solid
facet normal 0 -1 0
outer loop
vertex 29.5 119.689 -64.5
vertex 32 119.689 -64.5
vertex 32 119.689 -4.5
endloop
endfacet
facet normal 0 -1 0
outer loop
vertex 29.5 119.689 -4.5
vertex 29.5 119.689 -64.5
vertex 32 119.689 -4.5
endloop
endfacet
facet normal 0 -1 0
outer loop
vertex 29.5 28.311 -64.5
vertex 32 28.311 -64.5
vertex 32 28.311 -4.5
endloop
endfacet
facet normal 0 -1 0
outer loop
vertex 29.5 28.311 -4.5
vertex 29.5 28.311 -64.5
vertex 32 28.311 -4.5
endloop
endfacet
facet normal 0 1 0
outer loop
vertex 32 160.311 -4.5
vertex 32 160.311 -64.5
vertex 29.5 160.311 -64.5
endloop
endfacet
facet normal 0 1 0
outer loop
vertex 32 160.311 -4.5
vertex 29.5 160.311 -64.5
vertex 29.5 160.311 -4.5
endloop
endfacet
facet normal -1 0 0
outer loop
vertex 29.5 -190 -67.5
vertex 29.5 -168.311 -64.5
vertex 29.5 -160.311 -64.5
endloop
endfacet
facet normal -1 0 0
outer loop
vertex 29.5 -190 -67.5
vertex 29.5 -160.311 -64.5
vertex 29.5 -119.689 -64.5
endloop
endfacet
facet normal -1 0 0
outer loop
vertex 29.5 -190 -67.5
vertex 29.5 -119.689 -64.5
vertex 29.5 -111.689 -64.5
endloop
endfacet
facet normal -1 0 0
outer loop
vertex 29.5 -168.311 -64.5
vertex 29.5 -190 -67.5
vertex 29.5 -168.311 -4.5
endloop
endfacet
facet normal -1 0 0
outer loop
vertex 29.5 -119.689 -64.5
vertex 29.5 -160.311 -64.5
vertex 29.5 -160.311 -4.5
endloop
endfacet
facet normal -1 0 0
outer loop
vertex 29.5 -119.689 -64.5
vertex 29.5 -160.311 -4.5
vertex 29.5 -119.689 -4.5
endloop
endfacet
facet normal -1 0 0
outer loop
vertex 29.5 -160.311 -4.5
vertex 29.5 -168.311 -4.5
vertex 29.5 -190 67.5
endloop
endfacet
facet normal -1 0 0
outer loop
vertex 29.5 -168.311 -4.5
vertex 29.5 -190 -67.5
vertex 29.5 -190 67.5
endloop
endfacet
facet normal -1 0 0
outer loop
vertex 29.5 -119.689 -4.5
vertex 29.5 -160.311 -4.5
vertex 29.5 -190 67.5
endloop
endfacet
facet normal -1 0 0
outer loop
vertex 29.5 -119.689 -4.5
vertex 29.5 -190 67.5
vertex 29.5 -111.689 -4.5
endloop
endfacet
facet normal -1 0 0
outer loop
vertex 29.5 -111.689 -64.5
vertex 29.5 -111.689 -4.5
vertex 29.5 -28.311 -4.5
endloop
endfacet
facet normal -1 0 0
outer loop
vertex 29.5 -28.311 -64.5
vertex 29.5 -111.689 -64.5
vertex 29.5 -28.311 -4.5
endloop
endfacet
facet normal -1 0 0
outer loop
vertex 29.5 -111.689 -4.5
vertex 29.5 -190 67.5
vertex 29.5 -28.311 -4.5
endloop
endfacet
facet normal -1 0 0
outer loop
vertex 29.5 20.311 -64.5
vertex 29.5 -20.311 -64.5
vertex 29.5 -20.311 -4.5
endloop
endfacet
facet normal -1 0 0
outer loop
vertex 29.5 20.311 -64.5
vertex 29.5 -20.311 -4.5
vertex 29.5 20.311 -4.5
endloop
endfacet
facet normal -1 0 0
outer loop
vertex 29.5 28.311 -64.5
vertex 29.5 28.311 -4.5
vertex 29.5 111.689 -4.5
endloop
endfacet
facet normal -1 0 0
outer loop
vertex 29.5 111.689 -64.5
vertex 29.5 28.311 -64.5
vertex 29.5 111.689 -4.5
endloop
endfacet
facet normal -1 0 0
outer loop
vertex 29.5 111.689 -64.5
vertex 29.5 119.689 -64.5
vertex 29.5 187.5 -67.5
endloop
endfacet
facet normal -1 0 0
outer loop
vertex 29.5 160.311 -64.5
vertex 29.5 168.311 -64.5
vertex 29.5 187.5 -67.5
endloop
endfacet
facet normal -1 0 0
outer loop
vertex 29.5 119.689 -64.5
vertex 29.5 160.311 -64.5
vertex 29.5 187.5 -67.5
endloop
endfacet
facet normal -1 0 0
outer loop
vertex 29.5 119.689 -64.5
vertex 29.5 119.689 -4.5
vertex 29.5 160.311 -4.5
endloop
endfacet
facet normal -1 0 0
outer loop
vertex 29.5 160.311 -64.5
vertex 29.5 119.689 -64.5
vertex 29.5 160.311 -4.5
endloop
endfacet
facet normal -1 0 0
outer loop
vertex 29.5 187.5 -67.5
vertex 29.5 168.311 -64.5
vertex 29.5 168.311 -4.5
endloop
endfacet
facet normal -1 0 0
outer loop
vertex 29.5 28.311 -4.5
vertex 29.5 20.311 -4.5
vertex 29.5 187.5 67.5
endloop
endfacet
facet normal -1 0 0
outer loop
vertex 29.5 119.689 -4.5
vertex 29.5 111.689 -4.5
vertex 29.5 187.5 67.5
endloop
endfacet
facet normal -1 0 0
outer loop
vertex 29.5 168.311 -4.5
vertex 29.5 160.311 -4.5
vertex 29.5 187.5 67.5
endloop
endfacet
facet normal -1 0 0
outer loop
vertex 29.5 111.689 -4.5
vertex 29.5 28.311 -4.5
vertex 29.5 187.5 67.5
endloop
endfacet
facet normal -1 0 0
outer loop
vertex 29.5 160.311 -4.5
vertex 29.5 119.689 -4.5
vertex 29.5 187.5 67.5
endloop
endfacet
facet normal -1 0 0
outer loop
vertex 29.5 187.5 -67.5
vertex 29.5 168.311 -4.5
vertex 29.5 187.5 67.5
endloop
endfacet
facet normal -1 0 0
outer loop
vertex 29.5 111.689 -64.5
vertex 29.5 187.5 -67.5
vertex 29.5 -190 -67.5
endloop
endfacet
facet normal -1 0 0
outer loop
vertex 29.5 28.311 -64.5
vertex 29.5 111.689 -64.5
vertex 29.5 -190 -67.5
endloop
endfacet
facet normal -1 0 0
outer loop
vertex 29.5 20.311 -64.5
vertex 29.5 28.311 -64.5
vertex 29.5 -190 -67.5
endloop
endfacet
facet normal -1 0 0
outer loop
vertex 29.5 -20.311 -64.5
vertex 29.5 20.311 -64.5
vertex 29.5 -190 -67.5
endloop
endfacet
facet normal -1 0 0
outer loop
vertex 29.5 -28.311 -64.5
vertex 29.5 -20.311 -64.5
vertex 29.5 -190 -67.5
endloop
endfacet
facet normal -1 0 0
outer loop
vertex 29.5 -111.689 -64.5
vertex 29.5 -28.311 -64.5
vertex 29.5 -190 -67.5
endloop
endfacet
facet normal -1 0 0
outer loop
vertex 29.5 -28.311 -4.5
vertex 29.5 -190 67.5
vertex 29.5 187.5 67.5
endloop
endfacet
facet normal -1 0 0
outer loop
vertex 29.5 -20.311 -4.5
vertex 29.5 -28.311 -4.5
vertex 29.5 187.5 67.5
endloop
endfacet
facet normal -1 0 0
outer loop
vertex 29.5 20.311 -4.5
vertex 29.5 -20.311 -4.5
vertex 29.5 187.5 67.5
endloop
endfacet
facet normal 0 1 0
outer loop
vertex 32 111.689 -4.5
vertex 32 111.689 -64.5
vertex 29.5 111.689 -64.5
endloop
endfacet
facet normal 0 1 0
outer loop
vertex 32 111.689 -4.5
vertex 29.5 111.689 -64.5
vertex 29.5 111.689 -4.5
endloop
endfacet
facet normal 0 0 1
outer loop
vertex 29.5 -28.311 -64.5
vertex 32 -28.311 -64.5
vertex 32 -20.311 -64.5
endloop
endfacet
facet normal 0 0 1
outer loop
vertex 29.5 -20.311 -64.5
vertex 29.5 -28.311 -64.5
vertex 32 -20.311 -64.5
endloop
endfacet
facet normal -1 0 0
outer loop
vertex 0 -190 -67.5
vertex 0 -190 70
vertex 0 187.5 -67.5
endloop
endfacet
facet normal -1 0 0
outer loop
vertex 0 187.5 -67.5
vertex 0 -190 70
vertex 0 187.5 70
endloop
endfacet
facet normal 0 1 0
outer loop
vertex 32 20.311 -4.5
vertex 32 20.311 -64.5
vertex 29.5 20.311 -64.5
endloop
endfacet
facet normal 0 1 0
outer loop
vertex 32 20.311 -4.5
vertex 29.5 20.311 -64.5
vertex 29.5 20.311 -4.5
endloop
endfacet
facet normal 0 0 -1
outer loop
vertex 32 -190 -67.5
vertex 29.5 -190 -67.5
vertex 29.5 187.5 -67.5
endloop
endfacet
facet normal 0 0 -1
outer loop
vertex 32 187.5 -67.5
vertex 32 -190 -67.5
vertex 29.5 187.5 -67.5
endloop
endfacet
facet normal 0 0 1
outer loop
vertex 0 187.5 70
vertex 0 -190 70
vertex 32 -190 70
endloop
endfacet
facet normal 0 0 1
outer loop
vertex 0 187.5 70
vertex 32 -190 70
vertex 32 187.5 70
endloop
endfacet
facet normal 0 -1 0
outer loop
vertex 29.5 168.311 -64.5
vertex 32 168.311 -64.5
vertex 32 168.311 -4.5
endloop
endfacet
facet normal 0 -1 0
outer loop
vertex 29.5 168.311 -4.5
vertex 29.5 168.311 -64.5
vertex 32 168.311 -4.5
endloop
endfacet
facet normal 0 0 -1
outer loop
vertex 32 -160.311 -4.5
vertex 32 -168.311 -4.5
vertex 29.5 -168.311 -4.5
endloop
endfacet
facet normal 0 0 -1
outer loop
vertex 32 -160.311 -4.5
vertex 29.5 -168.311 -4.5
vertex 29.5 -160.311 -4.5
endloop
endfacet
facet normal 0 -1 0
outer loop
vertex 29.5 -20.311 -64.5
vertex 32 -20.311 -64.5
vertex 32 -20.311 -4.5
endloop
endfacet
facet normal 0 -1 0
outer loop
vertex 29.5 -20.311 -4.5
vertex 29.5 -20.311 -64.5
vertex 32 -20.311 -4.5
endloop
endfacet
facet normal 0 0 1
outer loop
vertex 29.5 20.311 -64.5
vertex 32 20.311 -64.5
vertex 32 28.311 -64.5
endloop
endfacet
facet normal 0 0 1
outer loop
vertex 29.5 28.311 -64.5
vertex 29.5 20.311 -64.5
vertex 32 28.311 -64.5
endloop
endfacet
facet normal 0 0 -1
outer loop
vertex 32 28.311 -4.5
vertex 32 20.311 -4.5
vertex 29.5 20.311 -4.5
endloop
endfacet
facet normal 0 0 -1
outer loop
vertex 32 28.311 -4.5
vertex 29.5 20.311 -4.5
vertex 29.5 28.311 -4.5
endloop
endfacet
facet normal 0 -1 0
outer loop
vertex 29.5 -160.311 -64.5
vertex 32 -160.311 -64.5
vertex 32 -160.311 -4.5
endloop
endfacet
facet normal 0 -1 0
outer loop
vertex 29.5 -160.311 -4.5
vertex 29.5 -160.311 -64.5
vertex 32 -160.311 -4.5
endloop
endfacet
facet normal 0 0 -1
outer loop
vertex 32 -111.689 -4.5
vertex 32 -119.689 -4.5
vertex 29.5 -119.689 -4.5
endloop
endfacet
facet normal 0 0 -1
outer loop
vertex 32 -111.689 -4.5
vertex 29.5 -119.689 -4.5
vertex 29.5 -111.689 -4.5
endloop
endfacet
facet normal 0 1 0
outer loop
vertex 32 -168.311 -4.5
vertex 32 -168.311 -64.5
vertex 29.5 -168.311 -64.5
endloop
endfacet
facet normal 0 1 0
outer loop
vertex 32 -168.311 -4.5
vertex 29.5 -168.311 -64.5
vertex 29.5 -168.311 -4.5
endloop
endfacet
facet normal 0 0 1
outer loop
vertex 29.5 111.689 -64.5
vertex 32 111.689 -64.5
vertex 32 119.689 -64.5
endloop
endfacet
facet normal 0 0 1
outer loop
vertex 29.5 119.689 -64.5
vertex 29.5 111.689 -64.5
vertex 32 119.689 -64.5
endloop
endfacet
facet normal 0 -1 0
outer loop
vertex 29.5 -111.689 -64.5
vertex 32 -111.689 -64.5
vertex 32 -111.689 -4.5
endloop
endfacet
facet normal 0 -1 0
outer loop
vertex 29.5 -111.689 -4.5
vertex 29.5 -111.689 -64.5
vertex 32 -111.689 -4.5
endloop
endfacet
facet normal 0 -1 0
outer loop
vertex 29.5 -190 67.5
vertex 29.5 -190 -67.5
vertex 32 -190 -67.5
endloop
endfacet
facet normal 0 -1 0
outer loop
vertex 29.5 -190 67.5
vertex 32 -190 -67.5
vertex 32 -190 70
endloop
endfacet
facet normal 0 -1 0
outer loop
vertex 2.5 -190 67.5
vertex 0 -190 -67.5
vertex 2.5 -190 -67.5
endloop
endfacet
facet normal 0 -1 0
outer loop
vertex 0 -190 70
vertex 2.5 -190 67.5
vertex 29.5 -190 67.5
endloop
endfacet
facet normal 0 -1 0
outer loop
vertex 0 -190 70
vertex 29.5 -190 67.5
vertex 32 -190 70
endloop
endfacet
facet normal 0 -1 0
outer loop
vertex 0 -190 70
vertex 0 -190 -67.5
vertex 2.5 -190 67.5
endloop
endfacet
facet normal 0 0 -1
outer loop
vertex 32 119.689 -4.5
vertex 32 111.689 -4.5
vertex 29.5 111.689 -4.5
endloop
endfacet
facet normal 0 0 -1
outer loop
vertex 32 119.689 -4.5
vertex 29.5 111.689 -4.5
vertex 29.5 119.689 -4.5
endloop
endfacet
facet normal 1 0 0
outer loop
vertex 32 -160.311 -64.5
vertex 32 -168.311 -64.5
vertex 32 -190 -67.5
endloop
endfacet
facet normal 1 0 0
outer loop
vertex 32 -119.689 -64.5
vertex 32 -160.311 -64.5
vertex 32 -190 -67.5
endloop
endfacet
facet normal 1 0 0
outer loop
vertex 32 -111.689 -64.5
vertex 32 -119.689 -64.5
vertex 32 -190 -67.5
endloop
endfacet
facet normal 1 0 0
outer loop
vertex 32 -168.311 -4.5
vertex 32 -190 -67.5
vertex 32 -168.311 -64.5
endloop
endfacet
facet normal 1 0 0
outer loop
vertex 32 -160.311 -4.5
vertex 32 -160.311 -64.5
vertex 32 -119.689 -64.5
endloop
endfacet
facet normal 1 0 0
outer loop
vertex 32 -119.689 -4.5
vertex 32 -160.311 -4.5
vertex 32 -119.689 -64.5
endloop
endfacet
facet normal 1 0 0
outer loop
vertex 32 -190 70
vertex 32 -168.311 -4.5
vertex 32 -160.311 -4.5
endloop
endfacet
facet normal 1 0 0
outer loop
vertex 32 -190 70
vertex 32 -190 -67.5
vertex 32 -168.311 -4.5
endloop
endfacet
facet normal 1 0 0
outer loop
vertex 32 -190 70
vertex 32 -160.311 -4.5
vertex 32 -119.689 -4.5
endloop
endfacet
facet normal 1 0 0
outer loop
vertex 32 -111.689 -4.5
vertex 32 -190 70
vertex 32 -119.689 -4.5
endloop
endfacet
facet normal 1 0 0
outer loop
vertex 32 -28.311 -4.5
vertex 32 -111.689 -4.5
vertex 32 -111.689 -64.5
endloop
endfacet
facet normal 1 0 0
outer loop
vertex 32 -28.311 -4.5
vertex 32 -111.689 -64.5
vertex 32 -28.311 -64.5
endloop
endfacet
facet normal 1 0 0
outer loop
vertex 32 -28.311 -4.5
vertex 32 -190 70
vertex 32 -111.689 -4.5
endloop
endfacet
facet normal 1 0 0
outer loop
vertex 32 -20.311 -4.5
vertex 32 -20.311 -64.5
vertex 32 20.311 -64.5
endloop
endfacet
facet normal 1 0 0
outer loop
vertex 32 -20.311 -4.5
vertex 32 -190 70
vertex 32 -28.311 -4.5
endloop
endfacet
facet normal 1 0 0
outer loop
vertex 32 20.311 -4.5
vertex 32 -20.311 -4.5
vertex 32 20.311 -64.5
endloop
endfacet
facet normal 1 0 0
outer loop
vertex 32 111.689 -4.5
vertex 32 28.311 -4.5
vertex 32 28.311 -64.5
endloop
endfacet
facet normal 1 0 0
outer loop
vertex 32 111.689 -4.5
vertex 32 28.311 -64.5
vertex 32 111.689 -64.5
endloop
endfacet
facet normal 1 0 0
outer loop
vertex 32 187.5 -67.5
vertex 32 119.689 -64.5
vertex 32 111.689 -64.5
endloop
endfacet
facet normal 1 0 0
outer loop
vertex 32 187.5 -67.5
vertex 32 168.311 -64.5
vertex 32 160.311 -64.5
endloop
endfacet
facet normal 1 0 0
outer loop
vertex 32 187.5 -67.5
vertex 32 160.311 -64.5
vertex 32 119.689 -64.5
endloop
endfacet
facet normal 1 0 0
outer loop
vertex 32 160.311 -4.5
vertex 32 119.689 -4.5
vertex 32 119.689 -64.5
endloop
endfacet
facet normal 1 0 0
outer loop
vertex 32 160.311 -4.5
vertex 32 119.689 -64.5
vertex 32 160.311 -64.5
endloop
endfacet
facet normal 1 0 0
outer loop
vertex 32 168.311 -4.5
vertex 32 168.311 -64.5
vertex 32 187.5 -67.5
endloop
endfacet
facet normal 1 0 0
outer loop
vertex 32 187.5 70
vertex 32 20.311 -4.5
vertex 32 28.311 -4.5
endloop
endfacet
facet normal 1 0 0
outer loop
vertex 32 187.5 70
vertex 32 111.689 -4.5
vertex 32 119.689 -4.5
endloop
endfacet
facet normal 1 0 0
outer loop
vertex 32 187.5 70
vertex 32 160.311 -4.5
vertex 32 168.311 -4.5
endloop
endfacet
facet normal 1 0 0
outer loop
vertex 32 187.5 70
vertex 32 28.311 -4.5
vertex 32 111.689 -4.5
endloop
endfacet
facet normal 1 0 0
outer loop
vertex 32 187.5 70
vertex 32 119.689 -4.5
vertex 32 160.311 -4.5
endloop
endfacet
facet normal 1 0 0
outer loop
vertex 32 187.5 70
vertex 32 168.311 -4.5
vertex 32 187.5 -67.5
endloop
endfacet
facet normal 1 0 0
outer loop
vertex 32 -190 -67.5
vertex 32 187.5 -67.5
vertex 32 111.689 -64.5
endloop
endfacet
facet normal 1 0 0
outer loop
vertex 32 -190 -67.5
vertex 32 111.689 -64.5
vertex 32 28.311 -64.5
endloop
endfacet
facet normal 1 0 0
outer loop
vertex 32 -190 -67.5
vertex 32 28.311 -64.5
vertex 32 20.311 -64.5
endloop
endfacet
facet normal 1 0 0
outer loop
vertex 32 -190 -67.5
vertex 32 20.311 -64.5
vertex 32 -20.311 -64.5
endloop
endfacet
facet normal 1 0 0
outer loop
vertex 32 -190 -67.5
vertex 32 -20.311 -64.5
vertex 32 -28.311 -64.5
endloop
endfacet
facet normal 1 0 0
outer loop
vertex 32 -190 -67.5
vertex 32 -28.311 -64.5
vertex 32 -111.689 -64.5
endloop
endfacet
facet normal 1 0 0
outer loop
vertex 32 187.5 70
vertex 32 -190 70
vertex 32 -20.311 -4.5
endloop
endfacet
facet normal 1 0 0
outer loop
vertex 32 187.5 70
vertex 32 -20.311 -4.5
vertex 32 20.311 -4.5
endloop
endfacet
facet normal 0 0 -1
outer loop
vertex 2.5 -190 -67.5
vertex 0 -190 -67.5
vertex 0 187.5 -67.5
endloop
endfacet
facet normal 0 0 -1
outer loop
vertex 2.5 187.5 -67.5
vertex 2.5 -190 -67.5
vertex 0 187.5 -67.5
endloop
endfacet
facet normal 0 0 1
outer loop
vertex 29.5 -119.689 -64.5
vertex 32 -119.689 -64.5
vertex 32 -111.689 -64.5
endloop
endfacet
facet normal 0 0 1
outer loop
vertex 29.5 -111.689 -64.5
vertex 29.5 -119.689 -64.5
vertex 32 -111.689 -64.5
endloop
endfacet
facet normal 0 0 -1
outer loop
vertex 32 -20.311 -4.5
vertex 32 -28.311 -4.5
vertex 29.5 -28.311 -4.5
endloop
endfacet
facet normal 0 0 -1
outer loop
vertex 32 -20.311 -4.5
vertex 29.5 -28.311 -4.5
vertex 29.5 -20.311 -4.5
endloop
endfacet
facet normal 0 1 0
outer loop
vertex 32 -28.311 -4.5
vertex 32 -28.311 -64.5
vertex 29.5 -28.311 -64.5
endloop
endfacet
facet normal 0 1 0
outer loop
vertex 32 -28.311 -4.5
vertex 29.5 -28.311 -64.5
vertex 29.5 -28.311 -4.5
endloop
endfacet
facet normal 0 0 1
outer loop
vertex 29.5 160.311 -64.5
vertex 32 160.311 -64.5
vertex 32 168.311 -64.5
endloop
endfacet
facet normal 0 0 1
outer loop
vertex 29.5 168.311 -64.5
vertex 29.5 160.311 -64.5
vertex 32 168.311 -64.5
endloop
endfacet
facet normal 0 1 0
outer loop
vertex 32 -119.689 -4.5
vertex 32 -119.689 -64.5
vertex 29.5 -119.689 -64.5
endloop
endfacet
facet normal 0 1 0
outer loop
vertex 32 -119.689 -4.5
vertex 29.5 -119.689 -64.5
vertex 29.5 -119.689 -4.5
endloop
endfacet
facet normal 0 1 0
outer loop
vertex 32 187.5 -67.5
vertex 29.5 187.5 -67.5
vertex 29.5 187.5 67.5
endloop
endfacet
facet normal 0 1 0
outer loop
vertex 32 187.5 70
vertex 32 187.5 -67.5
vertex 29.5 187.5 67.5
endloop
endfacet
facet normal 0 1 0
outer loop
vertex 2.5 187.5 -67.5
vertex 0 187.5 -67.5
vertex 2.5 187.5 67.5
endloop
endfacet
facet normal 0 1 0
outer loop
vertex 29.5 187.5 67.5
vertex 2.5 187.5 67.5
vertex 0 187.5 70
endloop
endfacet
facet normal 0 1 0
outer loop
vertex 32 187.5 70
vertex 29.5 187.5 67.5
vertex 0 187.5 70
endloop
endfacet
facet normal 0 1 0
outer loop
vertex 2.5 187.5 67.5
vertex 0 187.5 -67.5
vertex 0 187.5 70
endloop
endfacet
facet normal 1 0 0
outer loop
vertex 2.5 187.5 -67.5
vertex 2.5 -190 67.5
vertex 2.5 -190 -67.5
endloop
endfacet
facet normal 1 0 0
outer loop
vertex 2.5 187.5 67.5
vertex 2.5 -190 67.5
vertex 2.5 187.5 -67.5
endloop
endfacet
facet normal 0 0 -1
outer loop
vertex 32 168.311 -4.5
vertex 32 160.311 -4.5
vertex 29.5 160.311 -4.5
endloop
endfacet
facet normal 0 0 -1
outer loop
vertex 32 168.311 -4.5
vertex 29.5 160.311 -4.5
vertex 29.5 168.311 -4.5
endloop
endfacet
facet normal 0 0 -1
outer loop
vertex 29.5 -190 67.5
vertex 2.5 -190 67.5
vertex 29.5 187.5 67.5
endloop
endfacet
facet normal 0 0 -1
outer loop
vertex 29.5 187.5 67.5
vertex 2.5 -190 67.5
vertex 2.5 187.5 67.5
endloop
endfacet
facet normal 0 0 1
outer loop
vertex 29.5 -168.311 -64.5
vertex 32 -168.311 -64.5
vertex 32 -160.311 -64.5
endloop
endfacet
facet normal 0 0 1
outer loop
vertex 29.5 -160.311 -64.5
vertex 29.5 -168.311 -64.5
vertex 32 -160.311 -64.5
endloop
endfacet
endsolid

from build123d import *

# Parameters (mm, degrees)
F0_W     = 380
F0_H     = 140
F1_DEPTH = 32
F2_T     = -2.5
F3_DEPTH = 2.5
F4_DEPTH = 2.5
F5_W     = 8
F5_H     = 60
F6_DEPTH = 2.5


with BuildPart() as f1:
    # F0 (on Right) → F1 (new body)
    with BuildSketch(Plane.YZ):
        Rectangle(F0_W, F0_H)
    extrude(amount=F1_DEPTH)

    # F2
    f2_openings = [f1.faces().sort_by_distance(p)[0] for p in [
        (16, -190, 0),
    ]]
    offset(amount=F2_T, openings=f2_openings)

    # F3 (cut): a face of the model
    f3_faces = [f1.faces().sort_by_distance(p)[0] for p in [
        (16, 0, -70),
    ]]
    extrude(f3_faces, amount=-F3_DEPTH, mode=Mode.SUBTRACT)

    # F4 (cut): a face of the model
    f4_faces = [f1.faces().sort_by_distance(p)[0] for p in [
        (16, 190, 1.25),
    ]]
    extrude(f4_faces, amount=-F4_DEPTH, mode=Mode.SUBTRACT)

    # F5 (on face) → F6 (cut, through all)
    with BuildSketch(Plane.YZ.offset(32)):
        with Locations((-164.3113616109, -34.5)):
            Rectangle(F5_W, F5_H)
        with Locations((-115.6886383891, -34.5)):
            Rectangle(F5_W, F5_H)
        with Locations((24.3113616109, -34.5)):
            Rectangle(F5_W, F5_H)
        with Locations((-24.3113616109, -34.5)):
            Rectangle(F5_W, F5_H)
        with Locations((164.3113616109, -34.5)):
            Rectangle(F5_W, F5_H)
        with Locations((115.6886383891, -34.5)):
            Rectangle(F5_W, F5_H)
    extrude(amount=-F6_DEPTH, mode=Mode.SUBTRACT)


solid = f1.part
